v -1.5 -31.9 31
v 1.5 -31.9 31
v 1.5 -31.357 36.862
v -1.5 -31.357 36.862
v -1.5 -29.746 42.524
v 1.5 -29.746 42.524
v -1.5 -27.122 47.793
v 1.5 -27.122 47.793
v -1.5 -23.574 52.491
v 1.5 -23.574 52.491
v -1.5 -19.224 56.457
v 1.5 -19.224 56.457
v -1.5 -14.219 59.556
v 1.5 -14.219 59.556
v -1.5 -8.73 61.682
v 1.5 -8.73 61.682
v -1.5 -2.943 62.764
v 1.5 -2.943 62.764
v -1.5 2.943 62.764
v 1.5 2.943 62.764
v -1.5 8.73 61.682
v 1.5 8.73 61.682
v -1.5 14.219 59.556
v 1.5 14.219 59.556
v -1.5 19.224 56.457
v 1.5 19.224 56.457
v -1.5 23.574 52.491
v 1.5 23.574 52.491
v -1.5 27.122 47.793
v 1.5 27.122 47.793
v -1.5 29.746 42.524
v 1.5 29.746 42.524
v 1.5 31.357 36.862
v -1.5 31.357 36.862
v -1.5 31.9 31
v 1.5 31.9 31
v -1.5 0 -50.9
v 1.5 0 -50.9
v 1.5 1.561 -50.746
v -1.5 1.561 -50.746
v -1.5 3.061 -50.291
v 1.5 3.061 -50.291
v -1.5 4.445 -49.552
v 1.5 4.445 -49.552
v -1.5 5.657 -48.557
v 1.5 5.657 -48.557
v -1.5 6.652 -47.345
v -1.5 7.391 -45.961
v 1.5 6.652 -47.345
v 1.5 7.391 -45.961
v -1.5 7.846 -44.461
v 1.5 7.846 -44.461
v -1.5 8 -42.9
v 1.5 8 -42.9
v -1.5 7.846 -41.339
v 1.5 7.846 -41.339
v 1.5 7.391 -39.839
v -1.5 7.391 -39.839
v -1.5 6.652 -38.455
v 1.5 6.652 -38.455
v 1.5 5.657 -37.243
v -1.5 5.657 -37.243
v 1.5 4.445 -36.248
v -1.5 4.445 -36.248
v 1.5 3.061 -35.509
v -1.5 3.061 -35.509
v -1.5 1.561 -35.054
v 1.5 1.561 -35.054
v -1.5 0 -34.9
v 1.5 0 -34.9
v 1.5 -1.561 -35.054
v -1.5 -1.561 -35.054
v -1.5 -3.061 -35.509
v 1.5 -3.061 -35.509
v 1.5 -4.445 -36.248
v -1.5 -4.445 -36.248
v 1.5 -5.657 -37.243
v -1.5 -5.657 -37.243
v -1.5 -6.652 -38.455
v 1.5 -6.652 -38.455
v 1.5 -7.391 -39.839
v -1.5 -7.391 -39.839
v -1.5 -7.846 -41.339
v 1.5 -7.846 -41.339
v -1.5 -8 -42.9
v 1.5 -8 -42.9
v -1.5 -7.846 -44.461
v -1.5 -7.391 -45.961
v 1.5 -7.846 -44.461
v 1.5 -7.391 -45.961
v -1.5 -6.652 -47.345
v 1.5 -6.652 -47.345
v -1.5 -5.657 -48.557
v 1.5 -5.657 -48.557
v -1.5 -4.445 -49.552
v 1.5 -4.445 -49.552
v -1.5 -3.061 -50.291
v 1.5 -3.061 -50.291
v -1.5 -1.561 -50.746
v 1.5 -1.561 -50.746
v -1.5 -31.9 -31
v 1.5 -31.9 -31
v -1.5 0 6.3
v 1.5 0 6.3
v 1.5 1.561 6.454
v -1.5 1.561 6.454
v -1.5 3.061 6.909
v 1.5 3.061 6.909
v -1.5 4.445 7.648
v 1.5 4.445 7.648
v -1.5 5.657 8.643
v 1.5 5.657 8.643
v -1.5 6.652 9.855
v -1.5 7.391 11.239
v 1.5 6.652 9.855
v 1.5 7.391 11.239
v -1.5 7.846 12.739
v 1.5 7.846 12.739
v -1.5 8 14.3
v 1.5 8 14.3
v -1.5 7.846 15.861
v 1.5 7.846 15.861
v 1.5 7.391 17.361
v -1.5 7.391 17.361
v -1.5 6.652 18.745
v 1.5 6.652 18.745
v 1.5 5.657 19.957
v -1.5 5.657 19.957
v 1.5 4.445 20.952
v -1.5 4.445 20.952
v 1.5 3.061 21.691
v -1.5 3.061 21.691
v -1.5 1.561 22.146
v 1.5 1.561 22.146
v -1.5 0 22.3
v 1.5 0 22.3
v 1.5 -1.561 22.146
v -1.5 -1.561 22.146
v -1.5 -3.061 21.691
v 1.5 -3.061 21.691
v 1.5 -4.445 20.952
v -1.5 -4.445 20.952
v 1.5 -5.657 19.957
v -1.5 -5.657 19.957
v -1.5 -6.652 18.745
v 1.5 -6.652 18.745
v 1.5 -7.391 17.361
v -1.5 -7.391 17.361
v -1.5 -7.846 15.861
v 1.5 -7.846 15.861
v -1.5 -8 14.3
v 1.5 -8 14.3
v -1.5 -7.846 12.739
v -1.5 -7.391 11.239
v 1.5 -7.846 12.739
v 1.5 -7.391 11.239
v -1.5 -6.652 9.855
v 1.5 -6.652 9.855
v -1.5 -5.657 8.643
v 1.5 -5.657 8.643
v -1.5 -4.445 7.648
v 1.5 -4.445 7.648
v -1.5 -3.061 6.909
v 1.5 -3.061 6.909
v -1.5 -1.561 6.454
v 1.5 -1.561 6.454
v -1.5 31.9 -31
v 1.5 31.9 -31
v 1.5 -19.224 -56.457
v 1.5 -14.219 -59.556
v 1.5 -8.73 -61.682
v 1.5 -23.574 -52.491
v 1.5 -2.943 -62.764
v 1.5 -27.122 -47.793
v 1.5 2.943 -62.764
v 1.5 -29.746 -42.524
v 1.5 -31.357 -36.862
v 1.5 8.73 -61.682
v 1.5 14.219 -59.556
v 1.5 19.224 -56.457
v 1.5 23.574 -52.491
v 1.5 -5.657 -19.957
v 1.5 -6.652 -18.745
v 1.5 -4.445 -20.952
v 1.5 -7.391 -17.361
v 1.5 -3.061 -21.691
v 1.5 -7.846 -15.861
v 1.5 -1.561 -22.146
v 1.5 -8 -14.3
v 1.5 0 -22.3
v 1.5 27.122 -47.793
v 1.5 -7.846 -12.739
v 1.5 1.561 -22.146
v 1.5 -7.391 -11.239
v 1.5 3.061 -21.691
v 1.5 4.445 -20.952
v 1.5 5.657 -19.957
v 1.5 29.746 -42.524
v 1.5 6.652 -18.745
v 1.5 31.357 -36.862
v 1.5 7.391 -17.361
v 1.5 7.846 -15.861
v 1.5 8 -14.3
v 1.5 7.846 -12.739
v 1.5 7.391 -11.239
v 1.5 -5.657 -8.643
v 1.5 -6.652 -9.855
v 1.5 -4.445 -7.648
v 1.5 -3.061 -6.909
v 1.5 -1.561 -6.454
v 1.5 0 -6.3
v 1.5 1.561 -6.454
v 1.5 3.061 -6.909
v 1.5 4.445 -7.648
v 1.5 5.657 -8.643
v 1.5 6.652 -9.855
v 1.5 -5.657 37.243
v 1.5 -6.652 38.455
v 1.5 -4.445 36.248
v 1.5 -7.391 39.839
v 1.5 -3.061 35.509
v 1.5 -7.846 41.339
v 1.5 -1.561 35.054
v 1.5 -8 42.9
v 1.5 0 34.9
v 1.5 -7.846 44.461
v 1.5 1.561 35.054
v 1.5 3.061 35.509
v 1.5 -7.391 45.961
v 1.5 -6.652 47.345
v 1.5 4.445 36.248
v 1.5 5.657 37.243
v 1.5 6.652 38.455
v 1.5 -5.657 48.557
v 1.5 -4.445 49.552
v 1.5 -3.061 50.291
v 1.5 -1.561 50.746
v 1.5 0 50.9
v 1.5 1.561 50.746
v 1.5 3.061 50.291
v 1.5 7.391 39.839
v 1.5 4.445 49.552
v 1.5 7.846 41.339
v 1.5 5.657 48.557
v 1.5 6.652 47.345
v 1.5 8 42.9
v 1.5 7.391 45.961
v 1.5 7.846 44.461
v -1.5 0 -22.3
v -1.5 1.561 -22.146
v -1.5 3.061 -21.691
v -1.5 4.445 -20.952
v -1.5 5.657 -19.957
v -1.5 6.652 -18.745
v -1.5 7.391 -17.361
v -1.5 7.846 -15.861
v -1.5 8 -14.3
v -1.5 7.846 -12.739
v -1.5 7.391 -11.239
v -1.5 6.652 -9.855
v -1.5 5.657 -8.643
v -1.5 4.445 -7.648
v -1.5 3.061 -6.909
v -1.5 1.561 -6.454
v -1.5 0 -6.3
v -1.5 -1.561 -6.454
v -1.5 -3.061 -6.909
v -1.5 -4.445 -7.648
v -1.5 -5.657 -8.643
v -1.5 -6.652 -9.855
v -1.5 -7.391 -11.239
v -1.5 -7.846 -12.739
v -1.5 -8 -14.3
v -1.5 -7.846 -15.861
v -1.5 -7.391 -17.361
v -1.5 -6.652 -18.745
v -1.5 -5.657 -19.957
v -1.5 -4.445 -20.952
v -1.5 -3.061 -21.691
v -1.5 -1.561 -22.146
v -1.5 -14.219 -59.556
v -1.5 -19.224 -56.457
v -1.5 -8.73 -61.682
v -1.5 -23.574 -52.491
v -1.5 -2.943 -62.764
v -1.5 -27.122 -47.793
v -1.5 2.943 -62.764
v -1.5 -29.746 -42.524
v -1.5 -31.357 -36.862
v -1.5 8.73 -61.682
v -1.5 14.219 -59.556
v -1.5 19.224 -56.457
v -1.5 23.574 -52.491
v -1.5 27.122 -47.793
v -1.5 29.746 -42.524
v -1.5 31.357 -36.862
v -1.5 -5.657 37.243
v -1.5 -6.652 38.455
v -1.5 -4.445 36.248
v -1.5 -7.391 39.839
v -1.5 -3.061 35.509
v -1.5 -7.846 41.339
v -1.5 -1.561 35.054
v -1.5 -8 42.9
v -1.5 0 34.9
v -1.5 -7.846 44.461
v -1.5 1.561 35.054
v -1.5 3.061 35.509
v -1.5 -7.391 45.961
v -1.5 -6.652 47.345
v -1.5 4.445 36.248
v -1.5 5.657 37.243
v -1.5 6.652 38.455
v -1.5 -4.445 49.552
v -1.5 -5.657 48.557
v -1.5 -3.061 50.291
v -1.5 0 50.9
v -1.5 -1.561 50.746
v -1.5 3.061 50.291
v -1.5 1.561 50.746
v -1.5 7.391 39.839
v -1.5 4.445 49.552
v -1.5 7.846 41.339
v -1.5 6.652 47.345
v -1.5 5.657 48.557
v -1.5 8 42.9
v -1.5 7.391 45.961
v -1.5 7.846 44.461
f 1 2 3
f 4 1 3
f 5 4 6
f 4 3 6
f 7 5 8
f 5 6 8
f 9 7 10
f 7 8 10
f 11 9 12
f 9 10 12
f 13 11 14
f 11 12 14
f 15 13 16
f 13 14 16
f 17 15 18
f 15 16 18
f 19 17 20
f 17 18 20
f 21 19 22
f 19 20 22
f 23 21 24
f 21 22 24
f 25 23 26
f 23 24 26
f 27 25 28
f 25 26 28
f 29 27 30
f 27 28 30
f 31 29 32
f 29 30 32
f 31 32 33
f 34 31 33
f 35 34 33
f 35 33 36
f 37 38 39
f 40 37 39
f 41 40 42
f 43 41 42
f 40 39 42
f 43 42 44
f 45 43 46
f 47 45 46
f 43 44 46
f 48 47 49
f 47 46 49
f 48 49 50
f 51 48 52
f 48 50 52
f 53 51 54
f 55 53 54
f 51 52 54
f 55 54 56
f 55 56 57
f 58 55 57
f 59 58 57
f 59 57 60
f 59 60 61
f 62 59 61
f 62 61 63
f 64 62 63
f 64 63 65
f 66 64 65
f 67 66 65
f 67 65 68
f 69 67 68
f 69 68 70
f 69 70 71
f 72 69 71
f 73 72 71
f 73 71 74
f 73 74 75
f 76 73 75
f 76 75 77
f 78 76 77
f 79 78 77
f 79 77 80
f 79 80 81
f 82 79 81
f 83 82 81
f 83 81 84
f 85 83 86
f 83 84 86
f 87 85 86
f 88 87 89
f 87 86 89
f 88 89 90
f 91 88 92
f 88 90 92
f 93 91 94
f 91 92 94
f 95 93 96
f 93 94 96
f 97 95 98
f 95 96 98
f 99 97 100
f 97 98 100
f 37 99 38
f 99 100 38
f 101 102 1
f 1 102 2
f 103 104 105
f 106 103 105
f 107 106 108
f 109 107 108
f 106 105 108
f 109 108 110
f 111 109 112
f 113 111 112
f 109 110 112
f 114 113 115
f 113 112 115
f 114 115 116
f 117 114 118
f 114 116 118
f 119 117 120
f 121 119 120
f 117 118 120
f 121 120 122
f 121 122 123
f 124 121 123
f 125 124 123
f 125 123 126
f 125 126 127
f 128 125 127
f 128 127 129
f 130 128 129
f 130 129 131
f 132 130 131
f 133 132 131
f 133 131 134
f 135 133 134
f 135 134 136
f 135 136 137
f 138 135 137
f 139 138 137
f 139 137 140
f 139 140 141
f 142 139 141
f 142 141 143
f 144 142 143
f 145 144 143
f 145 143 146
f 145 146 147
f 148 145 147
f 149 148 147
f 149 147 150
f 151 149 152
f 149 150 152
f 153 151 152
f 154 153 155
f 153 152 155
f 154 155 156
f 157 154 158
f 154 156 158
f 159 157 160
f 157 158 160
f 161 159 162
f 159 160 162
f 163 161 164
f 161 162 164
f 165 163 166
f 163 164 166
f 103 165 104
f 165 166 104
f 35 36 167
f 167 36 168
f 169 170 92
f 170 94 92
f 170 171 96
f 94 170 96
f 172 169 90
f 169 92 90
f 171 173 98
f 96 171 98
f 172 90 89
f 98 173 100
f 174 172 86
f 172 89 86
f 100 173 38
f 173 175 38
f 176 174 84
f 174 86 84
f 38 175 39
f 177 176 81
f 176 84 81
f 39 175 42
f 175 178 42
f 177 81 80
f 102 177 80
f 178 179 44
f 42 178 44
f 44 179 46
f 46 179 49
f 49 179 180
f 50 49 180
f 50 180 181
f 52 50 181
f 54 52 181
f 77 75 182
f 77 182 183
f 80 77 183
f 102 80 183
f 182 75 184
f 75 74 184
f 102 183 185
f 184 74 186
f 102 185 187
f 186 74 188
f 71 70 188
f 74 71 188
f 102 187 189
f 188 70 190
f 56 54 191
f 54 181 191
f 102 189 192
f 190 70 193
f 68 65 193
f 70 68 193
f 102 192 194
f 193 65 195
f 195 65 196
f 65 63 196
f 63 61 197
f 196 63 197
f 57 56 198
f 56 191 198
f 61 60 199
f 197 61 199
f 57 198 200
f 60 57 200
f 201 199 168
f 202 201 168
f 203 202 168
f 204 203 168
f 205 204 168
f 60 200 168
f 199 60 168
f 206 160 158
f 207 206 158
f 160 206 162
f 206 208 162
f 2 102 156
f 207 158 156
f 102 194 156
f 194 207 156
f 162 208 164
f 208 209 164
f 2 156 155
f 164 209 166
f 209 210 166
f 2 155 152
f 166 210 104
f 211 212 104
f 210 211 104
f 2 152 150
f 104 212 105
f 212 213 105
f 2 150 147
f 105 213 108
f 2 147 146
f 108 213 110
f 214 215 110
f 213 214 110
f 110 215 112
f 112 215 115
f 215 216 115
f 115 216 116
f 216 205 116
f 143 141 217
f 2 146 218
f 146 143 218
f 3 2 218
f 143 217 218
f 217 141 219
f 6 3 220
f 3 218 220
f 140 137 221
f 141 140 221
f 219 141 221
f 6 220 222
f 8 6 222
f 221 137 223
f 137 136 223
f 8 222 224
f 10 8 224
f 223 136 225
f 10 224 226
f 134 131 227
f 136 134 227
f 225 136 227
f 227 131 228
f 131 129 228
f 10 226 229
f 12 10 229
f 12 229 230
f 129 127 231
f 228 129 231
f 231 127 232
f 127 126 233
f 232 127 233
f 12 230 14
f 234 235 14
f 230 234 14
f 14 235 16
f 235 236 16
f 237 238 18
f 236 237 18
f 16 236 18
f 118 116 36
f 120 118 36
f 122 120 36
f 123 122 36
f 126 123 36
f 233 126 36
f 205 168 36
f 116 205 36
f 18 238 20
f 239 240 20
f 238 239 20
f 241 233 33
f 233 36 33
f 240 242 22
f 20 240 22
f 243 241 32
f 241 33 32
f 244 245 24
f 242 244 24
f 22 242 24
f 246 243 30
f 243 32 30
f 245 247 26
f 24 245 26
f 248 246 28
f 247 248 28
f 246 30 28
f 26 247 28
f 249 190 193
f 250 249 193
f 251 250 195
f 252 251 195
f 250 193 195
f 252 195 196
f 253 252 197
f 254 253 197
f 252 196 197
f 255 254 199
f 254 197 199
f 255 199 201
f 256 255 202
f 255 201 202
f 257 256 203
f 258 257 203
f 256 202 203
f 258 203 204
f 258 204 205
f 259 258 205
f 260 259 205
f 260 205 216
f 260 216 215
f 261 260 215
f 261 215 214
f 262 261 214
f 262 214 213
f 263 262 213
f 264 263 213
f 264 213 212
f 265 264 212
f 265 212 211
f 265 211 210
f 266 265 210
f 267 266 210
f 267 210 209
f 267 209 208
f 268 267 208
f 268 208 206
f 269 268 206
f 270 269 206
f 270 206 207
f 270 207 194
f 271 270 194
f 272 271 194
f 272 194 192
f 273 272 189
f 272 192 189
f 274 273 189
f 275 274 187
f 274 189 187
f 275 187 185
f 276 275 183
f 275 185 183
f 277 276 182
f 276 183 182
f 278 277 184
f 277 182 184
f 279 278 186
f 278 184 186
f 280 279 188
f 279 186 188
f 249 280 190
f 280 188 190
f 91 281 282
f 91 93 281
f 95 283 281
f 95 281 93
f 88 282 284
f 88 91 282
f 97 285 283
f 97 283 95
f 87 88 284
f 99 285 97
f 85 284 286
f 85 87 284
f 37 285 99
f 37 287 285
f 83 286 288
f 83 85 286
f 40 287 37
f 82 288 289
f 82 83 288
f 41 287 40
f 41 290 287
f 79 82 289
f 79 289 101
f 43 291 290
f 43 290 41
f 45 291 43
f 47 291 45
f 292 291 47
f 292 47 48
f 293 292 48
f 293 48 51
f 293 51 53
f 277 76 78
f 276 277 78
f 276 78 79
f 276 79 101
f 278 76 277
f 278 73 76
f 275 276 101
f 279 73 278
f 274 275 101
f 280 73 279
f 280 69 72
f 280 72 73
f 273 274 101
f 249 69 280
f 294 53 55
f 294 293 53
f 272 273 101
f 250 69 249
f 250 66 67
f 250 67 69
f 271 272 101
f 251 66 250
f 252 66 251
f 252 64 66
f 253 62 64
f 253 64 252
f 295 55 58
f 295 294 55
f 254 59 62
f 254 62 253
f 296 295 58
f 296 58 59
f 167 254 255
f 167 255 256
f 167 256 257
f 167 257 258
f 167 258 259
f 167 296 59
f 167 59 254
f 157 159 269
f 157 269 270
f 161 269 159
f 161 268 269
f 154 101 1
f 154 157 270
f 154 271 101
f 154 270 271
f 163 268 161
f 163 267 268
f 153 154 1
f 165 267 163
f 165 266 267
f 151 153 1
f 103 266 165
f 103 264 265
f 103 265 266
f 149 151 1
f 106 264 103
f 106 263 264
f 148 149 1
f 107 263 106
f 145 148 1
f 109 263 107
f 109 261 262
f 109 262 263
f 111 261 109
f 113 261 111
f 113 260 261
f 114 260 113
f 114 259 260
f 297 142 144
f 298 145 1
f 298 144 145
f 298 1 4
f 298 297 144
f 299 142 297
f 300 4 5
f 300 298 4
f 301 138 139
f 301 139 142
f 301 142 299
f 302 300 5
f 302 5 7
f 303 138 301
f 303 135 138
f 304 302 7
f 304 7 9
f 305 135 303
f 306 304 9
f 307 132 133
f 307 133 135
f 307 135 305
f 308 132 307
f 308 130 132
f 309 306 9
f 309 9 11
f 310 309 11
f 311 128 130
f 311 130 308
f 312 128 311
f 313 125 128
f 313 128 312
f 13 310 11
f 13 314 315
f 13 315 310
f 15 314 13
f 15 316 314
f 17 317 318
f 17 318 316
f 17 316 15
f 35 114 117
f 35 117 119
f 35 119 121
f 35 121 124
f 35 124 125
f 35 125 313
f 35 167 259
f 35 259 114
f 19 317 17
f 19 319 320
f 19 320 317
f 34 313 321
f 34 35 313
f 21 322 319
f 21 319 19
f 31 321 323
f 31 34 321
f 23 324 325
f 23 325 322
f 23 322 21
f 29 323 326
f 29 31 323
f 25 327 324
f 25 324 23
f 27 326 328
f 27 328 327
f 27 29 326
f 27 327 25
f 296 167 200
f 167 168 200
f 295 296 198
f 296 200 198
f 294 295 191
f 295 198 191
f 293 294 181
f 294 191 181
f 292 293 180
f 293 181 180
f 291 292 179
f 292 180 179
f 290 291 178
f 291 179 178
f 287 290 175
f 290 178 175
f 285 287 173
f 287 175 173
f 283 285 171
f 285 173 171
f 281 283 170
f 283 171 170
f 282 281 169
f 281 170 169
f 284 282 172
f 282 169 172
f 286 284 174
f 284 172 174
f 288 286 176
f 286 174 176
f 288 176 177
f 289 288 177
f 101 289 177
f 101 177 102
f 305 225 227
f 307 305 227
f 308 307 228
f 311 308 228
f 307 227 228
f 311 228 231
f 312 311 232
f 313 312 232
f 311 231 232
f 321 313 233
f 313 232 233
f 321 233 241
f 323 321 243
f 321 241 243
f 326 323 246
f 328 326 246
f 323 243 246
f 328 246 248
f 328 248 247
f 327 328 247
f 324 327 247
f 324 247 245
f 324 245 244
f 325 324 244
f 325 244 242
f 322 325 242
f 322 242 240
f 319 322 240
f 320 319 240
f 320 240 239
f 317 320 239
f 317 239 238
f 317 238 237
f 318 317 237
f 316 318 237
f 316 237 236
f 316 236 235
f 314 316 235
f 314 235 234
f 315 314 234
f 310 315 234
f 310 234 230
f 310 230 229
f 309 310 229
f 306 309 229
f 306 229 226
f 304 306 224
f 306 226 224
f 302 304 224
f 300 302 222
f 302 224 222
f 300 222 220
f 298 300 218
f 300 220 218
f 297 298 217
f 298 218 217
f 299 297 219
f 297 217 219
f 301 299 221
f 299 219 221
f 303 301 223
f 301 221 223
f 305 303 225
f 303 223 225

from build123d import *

# Parameters (mm, degrees)
BOSS_EXTRUDE1_DEPTH = 1.5
SKETCH2_R           = 8
CUT_EXTRUDE1_DEPTH  = 71.590509277


with BuildPart() as part:
    # Sketch1 → Boss-Extrude1 (new, symmetric)
    with BuildSketch(Plane(origin=(0, 0, 0), x_dir=(0, 0, -1), z_dir=(1, 0, 0))):
        with BuildLine():
            Line((-31, 31.9), (31, 31.9))
            ThreePointArc((31, 31.9), (62.9, 0), (31, -31.9))
            Line((31, -31.9), (-31, -31.9))
            ThreePointArc((-31, -31.9), (-62.9, 0), (-31, 31.9))
        make_face()
    extrude(amount=BOSS_EXTRUDE1_DEPTH, both=True)

    # Sketch2 → Cut-Extrude1 (cut, through all)
    with BuildSketch(Plane(origin=(1.5, 0, 0), x_dir=(0, 0, -1), z_dir=(1, 0, 0))):
        with Locations((-14.3, 0)):
            Circle(SKETCH2_R)
        with Locations((-42.9, 0)):
            Circle(SKETCH2_R)
        with Locations((42.9, 0)):
            Circle(SKETCH2_R)
        with Locations((14.3, 0)):
            Circle(SKETCH2_R)
    extrude(amount=-CUT_EXTRUDE1_DEPTH, mode=Mode.SUBTRACT)


solid = part.part
